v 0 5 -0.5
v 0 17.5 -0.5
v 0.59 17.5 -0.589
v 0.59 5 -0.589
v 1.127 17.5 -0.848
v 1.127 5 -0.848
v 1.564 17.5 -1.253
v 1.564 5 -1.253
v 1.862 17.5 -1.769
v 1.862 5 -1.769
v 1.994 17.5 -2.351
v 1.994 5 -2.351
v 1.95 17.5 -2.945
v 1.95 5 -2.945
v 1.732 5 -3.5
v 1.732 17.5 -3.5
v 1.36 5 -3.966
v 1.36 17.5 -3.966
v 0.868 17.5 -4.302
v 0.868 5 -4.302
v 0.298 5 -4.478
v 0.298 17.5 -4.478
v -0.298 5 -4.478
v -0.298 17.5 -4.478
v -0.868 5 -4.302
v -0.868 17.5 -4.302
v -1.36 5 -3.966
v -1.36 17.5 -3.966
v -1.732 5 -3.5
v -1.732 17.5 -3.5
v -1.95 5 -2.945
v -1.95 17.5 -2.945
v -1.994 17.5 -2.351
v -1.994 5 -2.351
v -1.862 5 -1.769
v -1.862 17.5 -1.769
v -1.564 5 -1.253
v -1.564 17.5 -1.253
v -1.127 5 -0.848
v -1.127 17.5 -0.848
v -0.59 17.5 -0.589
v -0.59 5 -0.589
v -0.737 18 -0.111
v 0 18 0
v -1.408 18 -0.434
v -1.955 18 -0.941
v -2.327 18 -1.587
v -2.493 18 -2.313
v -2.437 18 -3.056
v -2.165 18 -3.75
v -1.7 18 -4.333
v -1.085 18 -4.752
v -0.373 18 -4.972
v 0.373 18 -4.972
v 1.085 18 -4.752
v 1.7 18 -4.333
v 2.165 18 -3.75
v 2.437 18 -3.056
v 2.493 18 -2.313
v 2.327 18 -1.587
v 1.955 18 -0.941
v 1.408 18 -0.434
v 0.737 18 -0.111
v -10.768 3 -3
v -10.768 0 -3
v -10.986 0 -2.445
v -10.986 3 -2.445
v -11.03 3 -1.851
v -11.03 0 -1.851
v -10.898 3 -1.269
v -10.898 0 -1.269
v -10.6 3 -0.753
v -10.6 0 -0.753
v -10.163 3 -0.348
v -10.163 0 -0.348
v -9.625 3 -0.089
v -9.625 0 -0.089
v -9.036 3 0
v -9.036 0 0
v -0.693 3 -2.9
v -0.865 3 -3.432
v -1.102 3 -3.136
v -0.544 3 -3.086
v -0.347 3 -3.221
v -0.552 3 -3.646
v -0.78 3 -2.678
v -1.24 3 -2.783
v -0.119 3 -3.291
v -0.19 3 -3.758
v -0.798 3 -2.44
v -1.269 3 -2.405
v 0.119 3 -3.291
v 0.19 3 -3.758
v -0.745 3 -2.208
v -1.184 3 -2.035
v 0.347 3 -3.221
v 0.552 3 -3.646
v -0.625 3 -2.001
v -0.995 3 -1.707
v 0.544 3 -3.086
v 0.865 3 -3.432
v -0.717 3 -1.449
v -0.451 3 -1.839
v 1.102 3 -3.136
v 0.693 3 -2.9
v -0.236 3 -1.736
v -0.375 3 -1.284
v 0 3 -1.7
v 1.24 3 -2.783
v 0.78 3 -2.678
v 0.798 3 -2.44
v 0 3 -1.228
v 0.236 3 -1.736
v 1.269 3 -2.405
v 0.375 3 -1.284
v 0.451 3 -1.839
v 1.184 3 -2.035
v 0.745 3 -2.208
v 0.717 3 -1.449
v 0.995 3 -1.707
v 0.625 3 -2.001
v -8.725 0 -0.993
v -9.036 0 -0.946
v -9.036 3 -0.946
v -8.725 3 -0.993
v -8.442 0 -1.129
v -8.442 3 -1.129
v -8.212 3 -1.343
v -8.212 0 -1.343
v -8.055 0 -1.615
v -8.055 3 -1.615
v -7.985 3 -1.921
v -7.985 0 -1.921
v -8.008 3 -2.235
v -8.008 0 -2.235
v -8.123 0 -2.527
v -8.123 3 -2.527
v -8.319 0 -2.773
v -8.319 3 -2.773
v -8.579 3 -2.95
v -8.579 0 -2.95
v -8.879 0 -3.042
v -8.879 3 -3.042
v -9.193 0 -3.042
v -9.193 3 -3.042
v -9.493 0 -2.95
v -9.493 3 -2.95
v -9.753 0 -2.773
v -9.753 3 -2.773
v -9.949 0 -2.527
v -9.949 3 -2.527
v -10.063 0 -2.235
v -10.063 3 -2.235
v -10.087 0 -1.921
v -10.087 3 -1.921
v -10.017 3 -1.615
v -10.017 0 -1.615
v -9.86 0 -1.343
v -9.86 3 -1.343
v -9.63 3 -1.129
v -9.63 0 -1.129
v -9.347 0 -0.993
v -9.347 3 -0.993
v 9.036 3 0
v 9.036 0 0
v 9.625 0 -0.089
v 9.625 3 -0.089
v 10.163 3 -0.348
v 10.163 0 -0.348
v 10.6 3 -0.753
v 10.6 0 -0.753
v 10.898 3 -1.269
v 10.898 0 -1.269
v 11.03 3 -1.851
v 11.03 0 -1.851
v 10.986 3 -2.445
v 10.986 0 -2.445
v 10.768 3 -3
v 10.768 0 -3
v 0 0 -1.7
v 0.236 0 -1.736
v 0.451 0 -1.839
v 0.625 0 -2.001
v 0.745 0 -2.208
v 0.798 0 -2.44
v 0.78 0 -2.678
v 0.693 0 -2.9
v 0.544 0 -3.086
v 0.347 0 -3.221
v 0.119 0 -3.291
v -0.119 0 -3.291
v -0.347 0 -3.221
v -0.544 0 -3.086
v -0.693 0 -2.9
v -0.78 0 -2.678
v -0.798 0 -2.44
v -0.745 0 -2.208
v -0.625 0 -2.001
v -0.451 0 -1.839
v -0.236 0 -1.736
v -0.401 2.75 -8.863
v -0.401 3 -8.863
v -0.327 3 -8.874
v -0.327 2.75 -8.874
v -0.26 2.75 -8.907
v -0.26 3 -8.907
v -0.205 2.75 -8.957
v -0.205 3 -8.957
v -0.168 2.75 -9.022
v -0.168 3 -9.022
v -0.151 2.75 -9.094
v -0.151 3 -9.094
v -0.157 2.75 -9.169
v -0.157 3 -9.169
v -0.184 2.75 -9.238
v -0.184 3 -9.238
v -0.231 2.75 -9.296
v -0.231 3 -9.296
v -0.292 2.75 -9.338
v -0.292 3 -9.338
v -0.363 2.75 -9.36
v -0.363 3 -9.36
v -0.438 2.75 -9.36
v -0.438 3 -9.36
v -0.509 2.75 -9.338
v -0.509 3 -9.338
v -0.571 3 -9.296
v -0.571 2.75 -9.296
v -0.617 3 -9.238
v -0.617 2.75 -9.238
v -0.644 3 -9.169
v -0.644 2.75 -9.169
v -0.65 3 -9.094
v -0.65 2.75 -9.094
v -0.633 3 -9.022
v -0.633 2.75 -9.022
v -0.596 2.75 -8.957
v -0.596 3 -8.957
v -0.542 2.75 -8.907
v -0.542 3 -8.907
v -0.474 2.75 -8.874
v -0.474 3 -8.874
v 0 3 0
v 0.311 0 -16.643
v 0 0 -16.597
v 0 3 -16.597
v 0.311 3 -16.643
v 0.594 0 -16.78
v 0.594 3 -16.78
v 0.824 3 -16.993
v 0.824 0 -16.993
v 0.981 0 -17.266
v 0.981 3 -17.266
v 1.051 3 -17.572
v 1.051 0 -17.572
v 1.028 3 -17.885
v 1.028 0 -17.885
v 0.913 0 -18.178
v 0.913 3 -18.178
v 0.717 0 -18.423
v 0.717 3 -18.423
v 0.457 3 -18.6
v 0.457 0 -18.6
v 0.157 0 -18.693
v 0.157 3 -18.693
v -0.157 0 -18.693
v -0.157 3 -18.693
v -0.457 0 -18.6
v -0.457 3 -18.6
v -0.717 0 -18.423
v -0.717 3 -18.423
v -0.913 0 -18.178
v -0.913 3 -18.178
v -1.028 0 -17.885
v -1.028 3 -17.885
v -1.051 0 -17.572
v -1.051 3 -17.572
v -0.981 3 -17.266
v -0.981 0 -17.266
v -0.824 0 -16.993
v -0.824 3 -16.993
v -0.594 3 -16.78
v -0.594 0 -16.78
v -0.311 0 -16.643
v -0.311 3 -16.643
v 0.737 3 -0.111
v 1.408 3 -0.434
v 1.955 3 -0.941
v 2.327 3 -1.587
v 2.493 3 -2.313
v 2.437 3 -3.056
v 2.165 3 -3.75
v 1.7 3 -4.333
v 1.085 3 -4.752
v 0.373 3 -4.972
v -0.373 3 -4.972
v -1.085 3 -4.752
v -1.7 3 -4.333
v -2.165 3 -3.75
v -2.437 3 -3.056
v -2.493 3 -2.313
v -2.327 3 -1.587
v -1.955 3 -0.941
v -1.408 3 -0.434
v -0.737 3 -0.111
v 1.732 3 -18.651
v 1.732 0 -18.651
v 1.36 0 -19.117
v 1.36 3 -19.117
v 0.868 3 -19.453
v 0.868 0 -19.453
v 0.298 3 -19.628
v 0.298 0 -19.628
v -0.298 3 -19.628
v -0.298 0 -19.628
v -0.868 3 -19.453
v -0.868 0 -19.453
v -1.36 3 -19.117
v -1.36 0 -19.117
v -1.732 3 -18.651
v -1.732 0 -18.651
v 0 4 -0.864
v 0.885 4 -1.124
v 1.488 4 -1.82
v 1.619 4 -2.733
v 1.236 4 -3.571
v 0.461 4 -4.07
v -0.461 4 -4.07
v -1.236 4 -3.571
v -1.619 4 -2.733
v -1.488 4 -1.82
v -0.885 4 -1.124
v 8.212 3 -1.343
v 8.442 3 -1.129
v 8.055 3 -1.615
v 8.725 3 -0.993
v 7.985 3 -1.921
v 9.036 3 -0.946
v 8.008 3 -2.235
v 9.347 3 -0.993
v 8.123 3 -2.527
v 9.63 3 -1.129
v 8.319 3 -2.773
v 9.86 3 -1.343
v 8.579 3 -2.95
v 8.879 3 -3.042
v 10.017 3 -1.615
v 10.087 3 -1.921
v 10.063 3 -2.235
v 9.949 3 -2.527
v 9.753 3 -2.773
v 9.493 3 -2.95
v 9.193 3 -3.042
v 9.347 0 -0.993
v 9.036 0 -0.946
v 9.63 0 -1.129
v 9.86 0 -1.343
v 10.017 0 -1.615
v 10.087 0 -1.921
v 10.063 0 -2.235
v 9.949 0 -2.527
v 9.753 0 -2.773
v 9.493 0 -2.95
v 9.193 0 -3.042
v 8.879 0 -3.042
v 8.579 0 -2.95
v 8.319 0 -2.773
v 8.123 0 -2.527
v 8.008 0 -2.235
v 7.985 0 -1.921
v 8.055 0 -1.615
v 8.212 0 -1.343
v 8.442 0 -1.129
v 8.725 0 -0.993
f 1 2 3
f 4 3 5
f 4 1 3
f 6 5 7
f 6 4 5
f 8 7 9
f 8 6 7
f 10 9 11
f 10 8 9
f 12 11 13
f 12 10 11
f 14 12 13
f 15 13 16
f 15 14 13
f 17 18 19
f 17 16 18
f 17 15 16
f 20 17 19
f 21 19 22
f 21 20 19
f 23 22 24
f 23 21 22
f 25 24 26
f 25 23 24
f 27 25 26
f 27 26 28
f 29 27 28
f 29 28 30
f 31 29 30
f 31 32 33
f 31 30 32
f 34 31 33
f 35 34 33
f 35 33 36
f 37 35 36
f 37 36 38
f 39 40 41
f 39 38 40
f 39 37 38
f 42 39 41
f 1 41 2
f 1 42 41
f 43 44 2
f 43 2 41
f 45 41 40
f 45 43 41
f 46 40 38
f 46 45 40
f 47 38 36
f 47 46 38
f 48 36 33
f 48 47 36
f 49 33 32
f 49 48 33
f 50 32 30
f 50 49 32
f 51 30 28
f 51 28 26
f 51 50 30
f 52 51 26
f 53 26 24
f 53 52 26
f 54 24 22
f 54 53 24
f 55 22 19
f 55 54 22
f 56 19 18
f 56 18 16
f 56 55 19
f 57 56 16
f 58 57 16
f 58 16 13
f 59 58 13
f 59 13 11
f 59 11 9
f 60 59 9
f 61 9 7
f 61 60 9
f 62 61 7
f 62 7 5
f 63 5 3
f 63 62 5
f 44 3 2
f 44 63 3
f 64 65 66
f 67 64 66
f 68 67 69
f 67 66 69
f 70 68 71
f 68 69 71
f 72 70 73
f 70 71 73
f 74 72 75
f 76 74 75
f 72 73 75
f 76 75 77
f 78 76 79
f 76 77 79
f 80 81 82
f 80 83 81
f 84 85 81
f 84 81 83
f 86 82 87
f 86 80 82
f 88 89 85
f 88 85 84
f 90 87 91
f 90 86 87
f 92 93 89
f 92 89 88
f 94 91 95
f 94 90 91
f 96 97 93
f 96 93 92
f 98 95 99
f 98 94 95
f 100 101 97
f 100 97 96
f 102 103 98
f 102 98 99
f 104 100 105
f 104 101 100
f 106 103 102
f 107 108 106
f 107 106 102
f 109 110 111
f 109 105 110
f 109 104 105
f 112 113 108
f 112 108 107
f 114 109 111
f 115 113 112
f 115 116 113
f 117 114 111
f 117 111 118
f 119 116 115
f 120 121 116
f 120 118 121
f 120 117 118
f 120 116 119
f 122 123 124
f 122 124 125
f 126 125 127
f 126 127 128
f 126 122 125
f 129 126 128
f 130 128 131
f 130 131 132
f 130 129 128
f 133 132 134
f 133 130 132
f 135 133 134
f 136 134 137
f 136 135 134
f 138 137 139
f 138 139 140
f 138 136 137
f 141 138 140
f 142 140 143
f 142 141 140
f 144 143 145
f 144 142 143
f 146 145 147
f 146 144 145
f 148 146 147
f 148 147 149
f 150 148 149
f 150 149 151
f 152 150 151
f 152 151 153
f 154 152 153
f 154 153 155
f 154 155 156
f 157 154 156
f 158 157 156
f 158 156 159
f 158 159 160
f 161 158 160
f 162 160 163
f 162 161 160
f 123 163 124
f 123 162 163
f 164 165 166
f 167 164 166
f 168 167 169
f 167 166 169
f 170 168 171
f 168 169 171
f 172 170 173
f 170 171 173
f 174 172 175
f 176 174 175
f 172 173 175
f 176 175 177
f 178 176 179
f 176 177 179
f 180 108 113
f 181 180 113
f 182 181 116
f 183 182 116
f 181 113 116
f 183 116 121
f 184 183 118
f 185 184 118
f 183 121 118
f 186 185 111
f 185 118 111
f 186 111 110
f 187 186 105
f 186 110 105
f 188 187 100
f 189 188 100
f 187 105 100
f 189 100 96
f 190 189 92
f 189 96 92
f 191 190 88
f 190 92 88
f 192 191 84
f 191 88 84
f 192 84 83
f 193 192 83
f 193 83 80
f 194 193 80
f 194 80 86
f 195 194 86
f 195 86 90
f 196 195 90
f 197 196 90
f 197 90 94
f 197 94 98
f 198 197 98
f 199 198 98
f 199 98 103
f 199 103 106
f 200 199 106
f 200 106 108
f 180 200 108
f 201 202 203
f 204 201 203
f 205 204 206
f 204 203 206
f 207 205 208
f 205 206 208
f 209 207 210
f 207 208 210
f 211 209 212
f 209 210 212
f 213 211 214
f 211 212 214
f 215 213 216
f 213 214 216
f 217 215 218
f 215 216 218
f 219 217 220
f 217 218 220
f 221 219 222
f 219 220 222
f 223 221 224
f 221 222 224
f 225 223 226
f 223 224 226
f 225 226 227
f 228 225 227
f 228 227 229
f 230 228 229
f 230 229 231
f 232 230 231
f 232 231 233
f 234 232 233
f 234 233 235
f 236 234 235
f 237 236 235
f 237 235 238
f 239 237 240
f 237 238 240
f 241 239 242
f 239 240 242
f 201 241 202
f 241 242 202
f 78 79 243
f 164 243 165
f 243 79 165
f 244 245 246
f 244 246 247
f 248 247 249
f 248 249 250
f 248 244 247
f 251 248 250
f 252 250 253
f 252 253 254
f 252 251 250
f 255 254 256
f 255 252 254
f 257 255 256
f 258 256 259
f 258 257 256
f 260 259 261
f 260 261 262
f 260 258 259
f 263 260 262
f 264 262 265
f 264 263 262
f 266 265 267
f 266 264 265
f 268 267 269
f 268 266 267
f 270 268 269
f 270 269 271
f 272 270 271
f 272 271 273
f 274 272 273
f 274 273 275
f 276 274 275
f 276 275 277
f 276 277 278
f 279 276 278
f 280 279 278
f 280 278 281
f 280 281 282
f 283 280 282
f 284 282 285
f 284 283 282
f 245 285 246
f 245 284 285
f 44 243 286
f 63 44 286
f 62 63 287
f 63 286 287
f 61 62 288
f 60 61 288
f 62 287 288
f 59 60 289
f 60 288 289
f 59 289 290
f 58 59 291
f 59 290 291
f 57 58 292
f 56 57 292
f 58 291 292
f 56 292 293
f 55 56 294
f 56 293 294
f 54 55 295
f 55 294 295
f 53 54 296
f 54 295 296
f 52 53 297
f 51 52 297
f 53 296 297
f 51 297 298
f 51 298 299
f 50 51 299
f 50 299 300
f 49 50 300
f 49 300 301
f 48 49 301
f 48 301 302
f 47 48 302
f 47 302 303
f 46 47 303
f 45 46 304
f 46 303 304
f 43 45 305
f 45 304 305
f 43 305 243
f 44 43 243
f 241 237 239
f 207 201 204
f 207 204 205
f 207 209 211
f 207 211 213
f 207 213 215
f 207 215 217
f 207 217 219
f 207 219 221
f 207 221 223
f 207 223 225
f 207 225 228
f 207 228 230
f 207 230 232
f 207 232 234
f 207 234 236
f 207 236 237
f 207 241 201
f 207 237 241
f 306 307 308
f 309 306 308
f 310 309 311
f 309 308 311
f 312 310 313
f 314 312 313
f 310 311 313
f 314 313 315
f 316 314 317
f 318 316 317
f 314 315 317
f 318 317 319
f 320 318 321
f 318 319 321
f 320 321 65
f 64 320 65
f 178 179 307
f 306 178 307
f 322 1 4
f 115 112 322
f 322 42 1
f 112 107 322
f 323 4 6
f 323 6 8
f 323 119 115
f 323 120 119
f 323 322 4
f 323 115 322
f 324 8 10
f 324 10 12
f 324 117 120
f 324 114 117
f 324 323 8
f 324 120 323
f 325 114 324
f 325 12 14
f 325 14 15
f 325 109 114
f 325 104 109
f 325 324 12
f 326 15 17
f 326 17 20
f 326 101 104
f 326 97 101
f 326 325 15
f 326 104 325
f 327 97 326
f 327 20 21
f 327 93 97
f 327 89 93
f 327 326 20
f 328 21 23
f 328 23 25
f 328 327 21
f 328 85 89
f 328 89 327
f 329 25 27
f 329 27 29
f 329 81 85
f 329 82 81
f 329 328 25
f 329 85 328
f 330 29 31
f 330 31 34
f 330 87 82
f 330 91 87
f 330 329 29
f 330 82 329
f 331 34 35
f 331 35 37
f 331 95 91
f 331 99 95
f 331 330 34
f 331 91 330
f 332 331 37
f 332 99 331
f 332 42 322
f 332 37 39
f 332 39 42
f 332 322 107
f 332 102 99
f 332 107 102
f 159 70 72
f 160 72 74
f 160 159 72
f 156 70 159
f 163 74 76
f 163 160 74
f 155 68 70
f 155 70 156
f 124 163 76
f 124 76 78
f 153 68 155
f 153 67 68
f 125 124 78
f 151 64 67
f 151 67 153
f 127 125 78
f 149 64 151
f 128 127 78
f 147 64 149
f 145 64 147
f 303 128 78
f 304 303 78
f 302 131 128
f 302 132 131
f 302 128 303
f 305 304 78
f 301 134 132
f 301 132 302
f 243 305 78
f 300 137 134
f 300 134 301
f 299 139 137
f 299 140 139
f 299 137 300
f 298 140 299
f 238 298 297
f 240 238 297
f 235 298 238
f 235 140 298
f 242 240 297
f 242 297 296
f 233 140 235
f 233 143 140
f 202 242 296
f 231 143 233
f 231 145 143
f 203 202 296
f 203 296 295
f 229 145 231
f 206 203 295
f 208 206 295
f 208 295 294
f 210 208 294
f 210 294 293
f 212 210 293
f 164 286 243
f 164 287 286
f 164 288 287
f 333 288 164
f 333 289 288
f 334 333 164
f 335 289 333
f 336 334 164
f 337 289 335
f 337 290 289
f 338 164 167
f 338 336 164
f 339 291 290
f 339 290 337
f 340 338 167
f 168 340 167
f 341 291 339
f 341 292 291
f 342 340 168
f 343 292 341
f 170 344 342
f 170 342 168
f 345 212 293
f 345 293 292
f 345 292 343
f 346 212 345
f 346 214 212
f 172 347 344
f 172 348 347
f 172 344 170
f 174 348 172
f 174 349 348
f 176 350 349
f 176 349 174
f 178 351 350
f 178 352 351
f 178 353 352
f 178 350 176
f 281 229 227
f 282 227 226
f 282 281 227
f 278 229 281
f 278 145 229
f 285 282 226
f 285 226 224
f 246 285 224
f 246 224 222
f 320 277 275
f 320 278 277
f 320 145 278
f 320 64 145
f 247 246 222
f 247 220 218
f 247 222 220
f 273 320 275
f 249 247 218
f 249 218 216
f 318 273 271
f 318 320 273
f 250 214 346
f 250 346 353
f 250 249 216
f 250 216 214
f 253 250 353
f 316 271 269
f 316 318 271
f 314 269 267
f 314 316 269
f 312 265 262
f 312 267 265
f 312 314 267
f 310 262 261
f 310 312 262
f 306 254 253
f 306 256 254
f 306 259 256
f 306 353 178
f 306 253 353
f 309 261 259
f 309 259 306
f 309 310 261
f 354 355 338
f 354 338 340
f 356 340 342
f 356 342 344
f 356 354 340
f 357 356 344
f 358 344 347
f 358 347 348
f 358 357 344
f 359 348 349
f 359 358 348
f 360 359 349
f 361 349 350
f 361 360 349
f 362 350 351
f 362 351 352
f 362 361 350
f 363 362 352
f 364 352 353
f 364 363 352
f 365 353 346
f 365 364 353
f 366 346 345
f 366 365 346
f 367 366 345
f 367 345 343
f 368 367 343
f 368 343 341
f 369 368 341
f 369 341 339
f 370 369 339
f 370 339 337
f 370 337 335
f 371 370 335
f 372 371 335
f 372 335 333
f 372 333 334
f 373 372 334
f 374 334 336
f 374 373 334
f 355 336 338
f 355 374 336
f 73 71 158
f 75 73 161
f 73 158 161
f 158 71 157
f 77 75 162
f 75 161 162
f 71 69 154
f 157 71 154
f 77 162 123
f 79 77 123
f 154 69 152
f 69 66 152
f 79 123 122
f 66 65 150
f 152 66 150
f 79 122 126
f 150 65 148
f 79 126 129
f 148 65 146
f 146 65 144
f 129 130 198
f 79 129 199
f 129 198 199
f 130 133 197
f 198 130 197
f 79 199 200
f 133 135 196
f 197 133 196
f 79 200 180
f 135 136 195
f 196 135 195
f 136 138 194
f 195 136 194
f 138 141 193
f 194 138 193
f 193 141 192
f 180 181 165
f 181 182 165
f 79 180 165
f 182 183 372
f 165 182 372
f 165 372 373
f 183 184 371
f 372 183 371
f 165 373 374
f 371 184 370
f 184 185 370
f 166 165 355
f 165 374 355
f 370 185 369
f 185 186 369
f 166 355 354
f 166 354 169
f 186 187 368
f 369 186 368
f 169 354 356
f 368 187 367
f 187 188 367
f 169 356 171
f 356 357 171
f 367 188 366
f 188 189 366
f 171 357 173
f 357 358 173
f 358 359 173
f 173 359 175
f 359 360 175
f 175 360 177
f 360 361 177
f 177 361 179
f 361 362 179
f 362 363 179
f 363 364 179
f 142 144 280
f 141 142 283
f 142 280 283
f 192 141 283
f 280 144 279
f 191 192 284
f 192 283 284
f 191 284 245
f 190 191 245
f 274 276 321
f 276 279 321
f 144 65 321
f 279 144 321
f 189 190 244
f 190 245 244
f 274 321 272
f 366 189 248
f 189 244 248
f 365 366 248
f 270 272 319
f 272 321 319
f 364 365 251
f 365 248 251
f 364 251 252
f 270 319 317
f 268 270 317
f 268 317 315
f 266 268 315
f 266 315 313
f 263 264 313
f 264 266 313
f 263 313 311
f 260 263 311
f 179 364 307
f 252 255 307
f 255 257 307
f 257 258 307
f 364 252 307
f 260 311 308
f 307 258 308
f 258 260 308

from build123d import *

# Parameters (mm, degrees)
SKETCH1_R           = 1.054
BOSS_EXTRUDE1_DEPTH = 3
SKETCH2_R           = 0.8
CUT_EXTRUDE1_DEPTH  = 23.736281859
SKETCH3_R           = 2.5
BOSS_EXTRUDE2_DEPTH = 15
CUT_EXTRUDE2_REACH  = 29.073
SKETCH4_R           = 2
CHAMFER1_SIZE       = 2
CHAMFER1_SIZE2      = 0.727940469
CHAMFER2_SIZE       = 0.5
SKETCH5_R           = 0.25
CUT_EXTRUDE3_DEPTH  = 0.25


with BuildPart() as part:
    # Sketch1 → Boss-Extrude1 (new body)
    with BuildSketch(Plane(origin=(0, 0, 0), x_dir=(1, 0, 0), z_dir=(0, 1, 0))):
        with BuildLine():
            Line((0, 0), (9.035898385, 0))
            ThreePointArc((9.035898385, 0), (10.767949192, 1), (10.767949192, 3))
            Line((10.767949192, 3), (1.732050808, 18.650635095))
            ThreePointArc((1.732050808, 18.650635095), (0, 19.650635095), (-1.732050808, 18.650635095))
            Line((-1.732050808, 18.650635095), (-10.767949192, 3))
            ThreePointArc((-10.767949192, 3), (-10.767949192, 1), (-9.035898385, 0))
            Line((-9.035898385, 0), (0, 0))
        make_face()
        with Locations(Location((0, 17.650635095, 0), (0, 0, 270))):
            Circle(SKETCH1_R, mode=Mode.SUBTRACT)
        with Locations(Location((-9.035898385, 2, 0), (0, 0, 270))):
            Circle(SKETCH1_R, mode=Mode.SUBTRACT)
        with Locations(Location((9.035898385, 2, 0), (0, 0, 270))):
            Circle(SKETCH1_R, mode=Mode.SUBTRACT)
    extrude(amount=BOSS_EXTRUDE1_DEPTH)

    # Sketch2 → Cut-Extrude1 (cut, through all)
    with BuildSketch(Plane(origin=(0, 3, 0), x_dir=(1, 0, 0), z_dir=(0, 1, 0))):
        with Locations(Location((0, 2.5, 0), (0, 0, 270))):
            Circle(SKETCH2_R)
    extrude(amount=-CUT_EXTRUDE1_DEPTH, mode=Mode.SUBTRACT)

    # Sketch3 → Boss-Extrude2 (add)
    with BuildSketch(Plane(origin=(0, 3, 0), x_dir=(1, 0, 0), z_dir=(0, 1, 0))):
        with Locations(Location((0, 2.5, 0), (0, 0, 270))):
            Circle(SKETCH3_R)
    extrude(amount=BOSS_EXTRUDE2_DEPTH)

    # Sketch4 → Cut-Extrude2 (cut, up to next)
    with BuildSketch(Plane(origin=(0, 3, 0), x_dir=(1, 0, 0), z_dir=(0, 1, 0)), mode=Mode.PRIVATE) as cut_extrude2_sk1:
        with Locations(Location((0, 2.5, 0), (0, 0, 270))):
            Circle(SKETCH4_R)
    cut_extrude2_tool1 = extrude(cut_extrude2_sk1.sketch, amount=CUT_EXTRUDE2_REACH, mode=Mode.PRIVATE) & part.part
    add(cut_extrude2_tool1.solids().sort_by_distance((0, 3, -2.5))[0], mode=Mode.SUBTRACT)

    # Chamfer1
    chamfer1_edges = [part.edges().sort_by_distance(p)[0] for p in [
        (0, 3, -4.5),
    ]]
    chamfer1_side = [part.faces().sort_by_distance(p)[0] for p in [
        (0, 10.5, -4.5),
    ]]
    chamfer(chamfer1_edges, length=CHAMFER1_SIZE, length2=CHAMFER1_SIZE2, reference=chamfer1_side[0])

    # Chamfer2
    chamfer2_edges = [part.edges().sort_by_distance(p)[0] for p in [
        (0, 18, -4.5),
    ]]
    chamfer(chamfer2_edges, length=CHAMFER2_SIZE - 0.0001)  # a hair under: the kernel refuses the full size

    # Sketch5 → Cut-Extrude3 (cut)
    with BuildSketch(Plane(origin=(0, 3, 0), x_dir=(1, 0, 0), z_dir=(0, 1, 0))):
        with Locations(Location((-0.400704282, 9.113083691, 0), (0, 0, 270))):
            Circle(SKETCH5_R)
    extrude(amount=-CUT_EXTRUDE3_DEPTH, mode=Mode.SUBTRACT)


solid = part.part
